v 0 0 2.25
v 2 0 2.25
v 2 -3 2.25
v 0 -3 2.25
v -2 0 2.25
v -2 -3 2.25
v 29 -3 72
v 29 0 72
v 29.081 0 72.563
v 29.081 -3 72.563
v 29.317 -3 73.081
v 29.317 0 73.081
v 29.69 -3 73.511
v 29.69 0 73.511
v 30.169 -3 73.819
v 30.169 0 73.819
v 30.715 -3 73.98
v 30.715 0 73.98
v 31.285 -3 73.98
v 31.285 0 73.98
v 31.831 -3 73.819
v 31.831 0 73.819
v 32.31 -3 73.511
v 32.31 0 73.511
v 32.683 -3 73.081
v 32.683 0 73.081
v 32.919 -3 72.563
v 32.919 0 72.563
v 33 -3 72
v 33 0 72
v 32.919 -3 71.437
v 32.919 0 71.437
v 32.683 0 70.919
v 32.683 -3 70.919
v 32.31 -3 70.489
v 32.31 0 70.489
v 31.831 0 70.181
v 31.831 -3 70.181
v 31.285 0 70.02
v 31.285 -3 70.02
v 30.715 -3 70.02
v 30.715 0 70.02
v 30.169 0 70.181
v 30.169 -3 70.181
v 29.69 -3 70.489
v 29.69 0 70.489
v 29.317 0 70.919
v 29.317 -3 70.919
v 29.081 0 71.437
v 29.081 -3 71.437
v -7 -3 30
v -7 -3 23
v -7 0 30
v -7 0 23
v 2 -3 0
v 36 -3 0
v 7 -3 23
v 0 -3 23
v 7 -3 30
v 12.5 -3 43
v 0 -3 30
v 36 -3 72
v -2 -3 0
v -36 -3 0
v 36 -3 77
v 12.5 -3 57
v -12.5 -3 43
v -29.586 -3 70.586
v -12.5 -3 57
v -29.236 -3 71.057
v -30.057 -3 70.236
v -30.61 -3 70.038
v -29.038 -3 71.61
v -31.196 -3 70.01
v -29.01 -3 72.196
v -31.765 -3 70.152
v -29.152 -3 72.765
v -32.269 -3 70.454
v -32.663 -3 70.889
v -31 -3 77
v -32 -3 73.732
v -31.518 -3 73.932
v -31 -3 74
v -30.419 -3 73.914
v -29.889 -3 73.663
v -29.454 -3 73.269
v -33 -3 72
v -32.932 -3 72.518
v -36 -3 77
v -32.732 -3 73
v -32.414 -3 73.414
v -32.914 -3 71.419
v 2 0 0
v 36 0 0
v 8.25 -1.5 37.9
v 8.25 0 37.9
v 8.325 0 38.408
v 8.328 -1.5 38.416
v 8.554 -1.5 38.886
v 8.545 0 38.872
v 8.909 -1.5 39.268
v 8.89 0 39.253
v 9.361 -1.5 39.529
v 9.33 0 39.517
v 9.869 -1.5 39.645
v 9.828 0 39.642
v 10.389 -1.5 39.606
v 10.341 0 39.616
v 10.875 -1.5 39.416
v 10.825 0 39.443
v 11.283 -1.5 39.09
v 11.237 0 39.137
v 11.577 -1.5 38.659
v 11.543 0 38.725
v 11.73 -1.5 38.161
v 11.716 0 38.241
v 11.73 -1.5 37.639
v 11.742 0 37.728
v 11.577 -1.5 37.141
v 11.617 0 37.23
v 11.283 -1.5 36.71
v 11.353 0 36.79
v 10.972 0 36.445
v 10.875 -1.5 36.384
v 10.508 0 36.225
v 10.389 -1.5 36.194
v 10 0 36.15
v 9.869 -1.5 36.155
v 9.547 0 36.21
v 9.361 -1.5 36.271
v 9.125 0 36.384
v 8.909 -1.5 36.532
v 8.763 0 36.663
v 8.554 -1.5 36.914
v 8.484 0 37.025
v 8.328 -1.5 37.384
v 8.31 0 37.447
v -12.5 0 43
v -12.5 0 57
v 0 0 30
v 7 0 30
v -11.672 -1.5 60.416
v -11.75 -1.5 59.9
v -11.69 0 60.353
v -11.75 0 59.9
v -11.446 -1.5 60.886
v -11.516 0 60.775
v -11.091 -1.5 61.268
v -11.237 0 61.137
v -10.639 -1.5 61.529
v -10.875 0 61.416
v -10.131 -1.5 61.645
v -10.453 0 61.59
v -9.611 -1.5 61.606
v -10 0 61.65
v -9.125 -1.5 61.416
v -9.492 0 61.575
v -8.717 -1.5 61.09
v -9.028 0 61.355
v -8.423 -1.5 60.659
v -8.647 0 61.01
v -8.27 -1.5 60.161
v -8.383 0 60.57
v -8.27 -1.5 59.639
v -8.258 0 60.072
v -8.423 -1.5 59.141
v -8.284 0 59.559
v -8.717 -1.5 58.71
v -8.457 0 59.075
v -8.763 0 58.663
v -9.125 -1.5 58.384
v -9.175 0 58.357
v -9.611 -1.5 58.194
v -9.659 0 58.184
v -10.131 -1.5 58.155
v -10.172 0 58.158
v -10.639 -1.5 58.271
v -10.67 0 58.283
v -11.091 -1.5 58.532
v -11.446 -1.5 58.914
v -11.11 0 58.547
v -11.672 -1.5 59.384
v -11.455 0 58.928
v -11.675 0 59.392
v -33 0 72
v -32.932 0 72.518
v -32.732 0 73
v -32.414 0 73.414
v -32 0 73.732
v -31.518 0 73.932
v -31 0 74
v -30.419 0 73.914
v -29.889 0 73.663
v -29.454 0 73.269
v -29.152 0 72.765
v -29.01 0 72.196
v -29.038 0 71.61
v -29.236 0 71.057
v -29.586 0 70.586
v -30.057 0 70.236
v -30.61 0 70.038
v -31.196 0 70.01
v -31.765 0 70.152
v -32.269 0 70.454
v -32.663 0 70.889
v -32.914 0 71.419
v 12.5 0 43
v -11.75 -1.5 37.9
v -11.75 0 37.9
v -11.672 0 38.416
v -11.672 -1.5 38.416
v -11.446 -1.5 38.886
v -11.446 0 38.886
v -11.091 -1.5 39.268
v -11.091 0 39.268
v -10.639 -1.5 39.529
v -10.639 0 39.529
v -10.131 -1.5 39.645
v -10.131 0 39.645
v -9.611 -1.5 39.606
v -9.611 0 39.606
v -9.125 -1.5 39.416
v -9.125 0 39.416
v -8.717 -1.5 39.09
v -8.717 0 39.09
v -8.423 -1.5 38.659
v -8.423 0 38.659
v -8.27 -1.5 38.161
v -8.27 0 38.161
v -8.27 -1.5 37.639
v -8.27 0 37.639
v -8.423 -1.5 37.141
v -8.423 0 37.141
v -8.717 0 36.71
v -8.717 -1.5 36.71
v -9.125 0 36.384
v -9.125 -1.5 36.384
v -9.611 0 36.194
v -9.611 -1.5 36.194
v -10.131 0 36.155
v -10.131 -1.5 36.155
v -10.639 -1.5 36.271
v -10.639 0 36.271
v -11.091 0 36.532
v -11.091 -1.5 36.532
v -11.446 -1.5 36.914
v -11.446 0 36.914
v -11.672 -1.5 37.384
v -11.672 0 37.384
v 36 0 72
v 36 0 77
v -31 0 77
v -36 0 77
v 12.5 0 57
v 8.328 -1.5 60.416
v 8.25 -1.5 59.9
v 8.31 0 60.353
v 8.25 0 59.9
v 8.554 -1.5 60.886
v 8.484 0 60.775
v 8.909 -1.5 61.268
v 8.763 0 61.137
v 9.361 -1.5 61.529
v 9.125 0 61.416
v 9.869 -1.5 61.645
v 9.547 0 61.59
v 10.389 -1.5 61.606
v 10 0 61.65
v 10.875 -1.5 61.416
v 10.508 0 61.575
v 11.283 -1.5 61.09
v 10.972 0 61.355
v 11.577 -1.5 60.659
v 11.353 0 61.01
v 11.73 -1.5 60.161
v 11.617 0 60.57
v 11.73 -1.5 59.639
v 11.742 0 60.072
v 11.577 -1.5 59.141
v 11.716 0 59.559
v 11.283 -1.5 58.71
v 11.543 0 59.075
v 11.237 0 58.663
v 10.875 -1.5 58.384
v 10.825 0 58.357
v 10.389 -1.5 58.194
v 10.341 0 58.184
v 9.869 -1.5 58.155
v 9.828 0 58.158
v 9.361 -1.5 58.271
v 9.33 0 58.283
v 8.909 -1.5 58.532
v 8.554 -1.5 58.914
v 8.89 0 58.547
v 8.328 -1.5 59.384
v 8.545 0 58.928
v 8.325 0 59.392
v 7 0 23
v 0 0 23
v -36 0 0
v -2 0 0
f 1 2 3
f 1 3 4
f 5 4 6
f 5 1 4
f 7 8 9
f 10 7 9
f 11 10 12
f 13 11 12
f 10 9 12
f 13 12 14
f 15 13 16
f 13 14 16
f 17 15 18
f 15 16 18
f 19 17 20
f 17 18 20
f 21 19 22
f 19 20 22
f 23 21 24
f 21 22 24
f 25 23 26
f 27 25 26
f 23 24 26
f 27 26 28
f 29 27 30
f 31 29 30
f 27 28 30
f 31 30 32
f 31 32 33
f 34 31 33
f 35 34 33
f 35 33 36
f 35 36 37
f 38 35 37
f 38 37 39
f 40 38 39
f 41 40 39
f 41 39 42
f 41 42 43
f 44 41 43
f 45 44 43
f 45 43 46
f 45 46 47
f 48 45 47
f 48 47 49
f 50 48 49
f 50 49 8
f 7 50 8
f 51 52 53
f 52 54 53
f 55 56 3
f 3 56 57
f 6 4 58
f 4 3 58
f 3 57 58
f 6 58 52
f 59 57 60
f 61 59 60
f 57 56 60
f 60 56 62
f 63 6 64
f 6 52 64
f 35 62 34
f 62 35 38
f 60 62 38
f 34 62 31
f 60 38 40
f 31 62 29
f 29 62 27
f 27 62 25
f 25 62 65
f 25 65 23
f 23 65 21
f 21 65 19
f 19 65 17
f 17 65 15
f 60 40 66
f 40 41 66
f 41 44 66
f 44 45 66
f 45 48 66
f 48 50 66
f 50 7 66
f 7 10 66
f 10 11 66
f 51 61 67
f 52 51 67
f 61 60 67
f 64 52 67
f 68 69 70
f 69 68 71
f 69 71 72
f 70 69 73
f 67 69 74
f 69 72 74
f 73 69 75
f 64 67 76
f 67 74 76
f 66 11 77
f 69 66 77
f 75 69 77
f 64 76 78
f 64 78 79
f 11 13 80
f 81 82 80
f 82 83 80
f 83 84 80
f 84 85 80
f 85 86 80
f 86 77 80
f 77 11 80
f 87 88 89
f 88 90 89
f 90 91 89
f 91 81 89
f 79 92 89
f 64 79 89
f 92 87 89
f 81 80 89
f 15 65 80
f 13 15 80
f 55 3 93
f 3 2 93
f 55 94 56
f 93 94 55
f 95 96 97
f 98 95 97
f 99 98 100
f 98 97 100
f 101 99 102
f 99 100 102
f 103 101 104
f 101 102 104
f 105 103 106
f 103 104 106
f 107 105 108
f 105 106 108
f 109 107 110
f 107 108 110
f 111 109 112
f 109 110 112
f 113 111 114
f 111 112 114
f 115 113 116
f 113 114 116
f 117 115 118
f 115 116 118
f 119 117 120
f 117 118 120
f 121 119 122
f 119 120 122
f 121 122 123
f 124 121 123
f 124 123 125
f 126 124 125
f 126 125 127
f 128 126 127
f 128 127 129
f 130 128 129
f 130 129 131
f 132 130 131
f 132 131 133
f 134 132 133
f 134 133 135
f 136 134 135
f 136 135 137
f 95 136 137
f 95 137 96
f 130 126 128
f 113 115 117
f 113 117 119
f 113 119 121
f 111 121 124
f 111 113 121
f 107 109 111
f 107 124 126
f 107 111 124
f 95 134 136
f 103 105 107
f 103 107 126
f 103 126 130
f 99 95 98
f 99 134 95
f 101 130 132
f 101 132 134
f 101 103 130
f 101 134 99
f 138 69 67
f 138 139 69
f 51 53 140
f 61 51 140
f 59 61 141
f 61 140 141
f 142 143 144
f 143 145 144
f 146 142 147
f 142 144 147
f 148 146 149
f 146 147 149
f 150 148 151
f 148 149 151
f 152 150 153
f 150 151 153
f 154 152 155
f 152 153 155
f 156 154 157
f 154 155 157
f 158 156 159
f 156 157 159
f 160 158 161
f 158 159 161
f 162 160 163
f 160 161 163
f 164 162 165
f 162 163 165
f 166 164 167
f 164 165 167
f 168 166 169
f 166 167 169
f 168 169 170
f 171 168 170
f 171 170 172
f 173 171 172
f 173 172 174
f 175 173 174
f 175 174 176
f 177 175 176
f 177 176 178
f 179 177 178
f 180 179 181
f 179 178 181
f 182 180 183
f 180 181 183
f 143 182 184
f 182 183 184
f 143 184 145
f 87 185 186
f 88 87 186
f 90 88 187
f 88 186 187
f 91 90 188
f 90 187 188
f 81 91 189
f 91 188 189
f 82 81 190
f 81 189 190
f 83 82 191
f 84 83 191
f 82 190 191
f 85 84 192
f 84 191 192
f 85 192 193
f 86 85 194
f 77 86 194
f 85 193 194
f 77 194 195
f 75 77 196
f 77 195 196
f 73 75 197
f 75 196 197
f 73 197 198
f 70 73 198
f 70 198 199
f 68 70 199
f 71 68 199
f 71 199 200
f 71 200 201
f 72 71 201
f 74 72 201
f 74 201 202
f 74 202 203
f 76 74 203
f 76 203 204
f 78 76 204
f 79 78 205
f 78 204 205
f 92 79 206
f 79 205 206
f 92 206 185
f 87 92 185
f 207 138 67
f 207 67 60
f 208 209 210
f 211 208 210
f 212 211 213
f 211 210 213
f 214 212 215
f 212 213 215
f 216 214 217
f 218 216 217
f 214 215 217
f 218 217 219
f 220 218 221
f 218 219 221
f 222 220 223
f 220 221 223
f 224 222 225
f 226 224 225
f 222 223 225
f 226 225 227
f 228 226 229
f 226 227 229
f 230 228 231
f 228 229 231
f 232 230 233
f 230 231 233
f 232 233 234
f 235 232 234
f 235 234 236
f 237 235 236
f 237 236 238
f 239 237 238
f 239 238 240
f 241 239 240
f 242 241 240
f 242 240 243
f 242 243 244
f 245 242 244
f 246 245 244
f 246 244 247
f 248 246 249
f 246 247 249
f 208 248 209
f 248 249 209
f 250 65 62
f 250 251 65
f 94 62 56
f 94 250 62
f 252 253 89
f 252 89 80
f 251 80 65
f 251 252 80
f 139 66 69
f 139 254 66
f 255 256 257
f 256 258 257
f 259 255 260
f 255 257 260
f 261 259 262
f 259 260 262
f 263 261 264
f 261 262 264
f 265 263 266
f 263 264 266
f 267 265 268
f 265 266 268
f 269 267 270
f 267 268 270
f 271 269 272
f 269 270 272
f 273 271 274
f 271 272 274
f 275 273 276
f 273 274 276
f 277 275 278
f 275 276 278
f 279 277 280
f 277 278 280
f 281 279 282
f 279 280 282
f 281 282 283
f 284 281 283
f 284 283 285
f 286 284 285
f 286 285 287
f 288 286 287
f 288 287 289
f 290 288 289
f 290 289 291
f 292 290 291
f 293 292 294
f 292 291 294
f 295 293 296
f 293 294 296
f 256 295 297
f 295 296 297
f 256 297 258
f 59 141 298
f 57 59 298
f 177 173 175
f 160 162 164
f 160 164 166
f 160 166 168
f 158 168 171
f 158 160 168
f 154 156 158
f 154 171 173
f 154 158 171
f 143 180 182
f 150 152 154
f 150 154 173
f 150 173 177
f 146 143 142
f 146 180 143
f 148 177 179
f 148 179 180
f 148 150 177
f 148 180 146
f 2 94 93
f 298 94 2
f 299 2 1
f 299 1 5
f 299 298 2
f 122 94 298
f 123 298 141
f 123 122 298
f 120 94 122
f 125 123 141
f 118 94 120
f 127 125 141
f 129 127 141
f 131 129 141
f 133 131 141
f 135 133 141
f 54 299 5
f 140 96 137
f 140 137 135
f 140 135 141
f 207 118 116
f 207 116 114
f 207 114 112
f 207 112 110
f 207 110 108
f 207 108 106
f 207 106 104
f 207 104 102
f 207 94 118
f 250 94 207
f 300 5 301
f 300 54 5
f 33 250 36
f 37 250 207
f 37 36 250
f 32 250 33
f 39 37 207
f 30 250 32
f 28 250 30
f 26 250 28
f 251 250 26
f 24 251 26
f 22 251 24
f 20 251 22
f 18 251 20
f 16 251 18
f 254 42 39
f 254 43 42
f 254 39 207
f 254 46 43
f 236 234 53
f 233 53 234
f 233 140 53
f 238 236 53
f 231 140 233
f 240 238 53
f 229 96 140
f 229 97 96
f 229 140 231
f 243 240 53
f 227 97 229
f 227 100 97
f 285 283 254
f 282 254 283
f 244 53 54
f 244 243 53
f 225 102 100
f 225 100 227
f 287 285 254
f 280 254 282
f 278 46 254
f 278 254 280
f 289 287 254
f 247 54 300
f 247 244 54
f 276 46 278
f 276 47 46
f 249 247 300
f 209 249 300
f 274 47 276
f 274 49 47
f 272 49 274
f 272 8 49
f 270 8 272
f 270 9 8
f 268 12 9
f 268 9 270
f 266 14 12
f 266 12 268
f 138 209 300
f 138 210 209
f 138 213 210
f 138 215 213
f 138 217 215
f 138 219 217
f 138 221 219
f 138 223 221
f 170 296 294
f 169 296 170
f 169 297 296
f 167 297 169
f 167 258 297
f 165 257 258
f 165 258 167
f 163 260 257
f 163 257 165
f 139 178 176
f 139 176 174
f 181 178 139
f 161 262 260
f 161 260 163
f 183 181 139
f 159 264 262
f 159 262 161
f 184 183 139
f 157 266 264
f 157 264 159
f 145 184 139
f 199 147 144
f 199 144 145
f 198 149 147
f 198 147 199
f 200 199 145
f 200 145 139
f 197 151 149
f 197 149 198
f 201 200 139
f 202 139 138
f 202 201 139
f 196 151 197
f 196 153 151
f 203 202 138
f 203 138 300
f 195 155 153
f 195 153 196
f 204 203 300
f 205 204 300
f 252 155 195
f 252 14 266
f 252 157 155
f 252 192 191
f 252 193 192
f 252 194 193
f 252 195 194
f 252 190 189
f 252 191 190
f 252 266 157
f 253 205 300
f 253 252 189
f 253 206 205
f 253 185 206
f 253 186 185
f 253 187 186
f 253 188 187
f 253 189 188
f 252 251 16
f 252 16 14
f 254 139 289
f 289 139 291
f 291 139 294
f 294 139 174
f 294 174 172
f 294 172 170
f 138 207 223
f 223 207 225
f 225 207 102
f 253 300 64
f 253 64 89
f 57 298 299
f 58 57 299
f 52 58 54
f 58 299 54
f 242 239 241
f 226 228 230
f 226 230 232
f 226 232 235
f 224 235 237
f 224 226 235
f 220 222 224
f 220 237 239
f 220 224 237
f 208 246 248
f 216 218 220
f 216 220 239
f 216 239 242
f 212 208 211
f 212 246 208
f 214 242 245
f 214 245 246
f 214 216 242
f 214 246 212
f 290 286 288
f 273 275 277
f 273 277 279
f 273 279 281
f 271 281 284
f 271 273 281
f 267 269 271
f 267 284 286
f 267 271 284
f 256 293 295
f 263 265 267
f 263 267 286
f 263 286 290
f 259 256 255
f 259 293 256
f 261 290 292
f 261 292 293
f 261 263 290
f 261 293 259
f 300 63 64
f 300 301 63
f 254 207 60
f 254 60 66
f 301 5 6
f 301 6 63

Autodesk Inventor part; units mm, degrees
ref_plane "YZ Plane" through (0, 0, 0) normal (1, 0, 0) x (0, 1, 0)
ref_plane "XZ Plane" through (0, 0, 0) normal (0, 1, 0) x (-1, 0, 0)
ref_plane "XY Plane" through (0, 0, 0) normal (0, 0, 1) x (1, 0, 0)
sketch "Boceto1" plane through (0, 0, 0) normal (0, 1, 0) x (-1, 0, 0)
  line L0 (0, 0) -> (36, 0)
  line L1 (36, 0) -> (36, 0)
  line L2 (36, 0) -> (36, 77)
  line L3 (36, 77) -> (36, 77)
  line L4 (36, 77) -> (-36, 77)
  line L5 (-36, 77) -> (-36, 0)
  line L6 (-36, 0) -> (0, 0)
  line L7 (36, 77) -> (31, 77)
  line L8 (31, 77) -> (31, 72)
  line L9 (-36, 77) -> (-36, 77)
  line L10 (-36, 77) -> (-36, 72)
  line L11 (-36, 72) -> (-31, 72)
  circle A0 centre (-31, 72) radius 2
  circle A1 centre (31, 72) radius 2
  line L12 (36, 0) -> (0, 0)
  line L13 (0, 0) -> (0, 2.25)
  line L14 (0, 2.25) -> (2, 2.25)
  line L15 (2, 2.25) -> (2, 0)
  line L16 (0, 2.25) -> (-2, 2.25)
  line L17 (-2, 2.25) -> (-2, 0)
  line L18 (0, 0) -> (0, 50)
  line L19 (-12.5, 57) -> (12.5, 57)
  line L20 (12.5, 57) -> (12.5, 43)
  line L21 (12.5, 43) -> (-12.5, 43)
  line L22 (-12.5, 43) -> (-12.5, 57)
  line L23 (-12.5, 57) -> (12.5, 43) construction
  line L24 (12.5, 57) -> (-12.5, 43) construction
  line L25 (-12.5, 57) -> (12.5, 57)
  line L26 (12.5, 57) -> (12.5, 62.4)
  line L27 (12.5, 62.4) -> (-12.5, 62.4)
  line L28 (-12.5, 62.4) -> (-12.5, 57)
  line L29 (12.5, 62.4) -> (10, 62.4)
  line L30 (10, 62.4) -> (10, 59.9)
  line L31 (-12.5, 62.4) -> (-10, 62.4)
  line L32 (-10, 62.4) -> (-10, 59.9)
  circle A2 centre (10, 59.9) radius 1.75
  circle A3 centre (-10, 59.9) radius 1.75
  line L33 (-12.5, 62.4) -> (-12.5, 35.4)
  line L34 (-12.5, 35.4) -> (12.5, 35.4)
  line L35 (12.5, 35.4) -> (12.5, 62.4)
  line L36 (12.5, 62.4) -> (-12.5, 62.4)
  line L37 (-12.5, 35.4) -> (-10, 35.4)
  line L38 (-10, 35.4) -> (-10, 37.9)
  line L39 (12.5, 35.4) -> (12.5, 37.9)
  line L40 (12.5, 37.9) -> (10, 37.9)
  circle A4 centre (10, 37.9) radius 1.75
  circle A5 centre (-10, 37.9) radius 1.75
  circle A6 centre (31, 72) radius 4
  circle A7 centre (-31, 72) radius 4
  line L41 (0, 0) -> (0, 30)
  line L42 (0, 30) -> (0, 23)
  line L43 (0, 23) -> (7, 23)
  line L44 (7, 23) -> (7, 30)
  line L45 (7, 30) -> (-7, 30)
  line L46 (-7, 30) -> (-7, 23)
  line L47 (-7, 23) -> (0, 23)
  point P0 (2, 0)
  dimension "d0" = 36
  dimension "d1" = 0
  dimension "d2" = 77
  dimension "d3" = 0
  dimension "d4" = 72
  dimension "d5" = 5
  dimension "d6" = 5
  dimension "d7" = 0
  dimension "d8" = 5
  dimension "d9" = 5
  dimension "d10" = 4
  dimension "d11" = 4
  dimension "d14" = 36
  dimension "d15" = 2.25
  dimension "d16" = 2
  dimension "d17" = 2
  dimension "d18" = 50
  dimension "d19" = 25
  dimension "d20" = 14
  dimension "d21" = 5.4
  dimension "d22" = 2.5
  dimension "d23" = 2.5
  dimension "d24" = 2.5
  dimension "d25" = 2.5
  dimension "d26" = 3.5
  dimension "d27" = 3.5
  dimension "d28" = 27
  dimension "d29" = 25
  dimension "d30" = 2.5
  dimension "d31" = 2.5
  dimension "d32" = 2.5
  dimension "d33" = 2.5
  dimension "d34" = 3.5
  dimension "d35" = 3.5
  dimension "d50" = 8
  dimension "d51" = 8
  dimension "d61" = 30
  dimension "d63" = 7
  dimension "d64" = 14
  dimension "d65" = 7
  dimension "d66" = 0
extrude "Extrusión1" add sketch "Boceto1" against normal blind 3 contours A6 | A7 | A5 | L34 L33 L21 L18 | A4 | L18 L21 L35 L34 | L15 L14 L16 L17 L6 L5 L4 L2 L0 | A2 | A3 | L19 L28 L27 L26
extrude "Extrusión2" cut sketch "Boceto1" against normal blind 1.5 contours A5 | A4 | A2 | A3
thread "Rosca1" size "M4x0.7" class "6H" standard "ANSI Metric M Profile" full length
thread "Rosca2" size "M4x0.7" class "6H" standard "ANSI Metric M Profile" full length
thread "Rosca3" size "M3.5x0.6" class "6H" standard "ANSI Metric M Profile" full length
thread "Rosca4" size "M3.5x0.6" class "6H" standard "ANSI Metric M Profile" full length
thread "Rosca5" size "M3.5x0.6" class "6H" standard "ANSI Metric M Profile" full length
thread "Rosca6" size "M3.5x0.6" class "6H" standard "ANSI Metric M Profile" full length
extrude "Extrusión3" [suppressed]
equation "\"d0\" = 0.5 * box_in_width"
equation "\"d2\" = box_in_deep"
equation "\"d4\" = box_in_width"
equation "\"d5\" = offset + 0.5 * screw_Dhead"
equation "\"d6\" = offset + 0.5 * screw_Dhead"
equation "\"d8\" = offset + 0.5 * screw_Dhead"
equation "\"d9\" = offset + 0.5 * screw_Dhead"
equation "\"d10\" = screw_d"
equation "\"d11\" = screw_d"
equation "\"d14\" = 0.5 * box_in_width"
equation "\"d15\" = 1.5 * thikness_box"
equation "\"d19\" = screen_width"
equation "\"d20\" = screen_height"
equation "\"d21\" = top_from_screen"
equation "\"d22\" = offset_screw_screen + 0.5 * screw_d_screen"
equation "\"d23\" = offset_screw_screen + 0.5 * screw_d_screen"
equation "\"d24\" = offset_screw_screen + 0.5 * screw_d_screen"
equation "\"d25\" = offset_screw_screen + 0.5 * screw_d_screen"
equation "\"d28\" = height_screen_total"
equation "\"d29\" = screen_width"
equation "\"d30\" = offset_screw_screen + 0.5 * screw_d_screen"
equation "\"d31\" = offset_screw_screen + 0.5 * screw_d_screen"
equation "\"d32\" = offset_screw_screen + 0.5 * screw_d_screen"
equation "\"d33\" = offset_screw_screen + 0.5 * screw_d_screen"
equation "\"d50\" = screw_Dhead"
equation "\"d51\" = screw_Dhead"
equation "\"d64\" = 2 * d63"
equation "\"d12\" = 2 * thikness_box"
equation "\"d36\" = deep_screw_screen"
equation "\"thikness\" = 2"
equation "\"offset\" = 1"
equation "\"r1\" = 5.55"
equation "\"r2o\" = 59.75"
equation "\"delta_y\" = 6"
equation "\"wire_d\" = 1"
equation "\"width_ang_spring\" = 5"
equation "\"spring_int_diam\" = 8.5"
equation "\"spring_ext_diam\" = 10.5"
equation "\"r3\" = 8.25"
equation "\"r3R\" = 4.75"
equation "\"r3T\" = 6.74537"
equation "\"alpha\" = 54.847297deg"
equation "\"alpha2\" = 270deg"
equation "\"theta3_recogido\" = 305.152703deg"
equation "\"delta_theta_3\" = 45deg"
equation "\"joint_width\" = 12"
equation "\"joint_radius\" = 7.75"
equation "\"shaft_width\" = 15"
equation "\"shaft_joint_diameter\" = 7.75"
equation "\"separation_space\" = 0.5"
equation "\"height_finger\" = 42"
equation "\"cell_screw_head_diameter\" = 4"
equation "\"cell_screw_diameter\" = 2"
equation "\"cell_space\" = 2"
equation "\"cell_width\" = 6"
equation "\"cell_theta_position\" = 60deg"
equation "\"cell_thikness\" = 1"
equation "\"cell_lenght\" = 37"
equation "\"cell_z_space\" = 5"
equation "\"wire_D\" = 2.3"
equation "\"width_link\" = 8"
equation "\"Dt\" = 1.05949"
equation "\"Djoint_shaft\" = 2.3"
equation "\"shaft_x\" = 1.45"
equation "\"shaft_y\" = 6.45"
equation "\"lenght_body_link\" = 186.05"
equation "\"lenght_bar_support\" = 201.65"
equation "\"wire_spring_d\" = 1"
equation "\"spring_int_d\" = 6"
equation "\"spring_lenght\" = 28"
equation "\"trigger_offset\" = 2"
equation "\"m2_theta2o\" = 107deg"
equation "\"m2_r2\" = 28"
equation "\"e\" = 9"
equation "\"So\" = 17"
equation "\"m2_theta3o\" = -30deg"
equation "\"m2_r3\" = 19.75"
equation "\"m2_delta_theta1\" = 15deg"
equation "\"m2_theta3f\" = -60deg"
equation "\"trigger_thumb_lenght\" = 6"
equation "\"width_r12\" = 8"
equation "\"m2_r1\" = 25.2"
equation "\"r3_thikness\" = 3.5"
equation "\"t_thikness\" = 3"
equation "\"tg_width\" = 4"
equation "\"pivot_screw_d\" = 4"
equation "\"pivot_diameter\" = 7"
equation "\"sj_diam_shaft\" = 6"
equation "\"sj_groove\" = 2"
equation "\"sj_groove_deep\" = 7"
equation "\"sj_head_D\" = 7"
equation "\"sj_head_d\" = 4.7464"
equation "\"sj_head_height\" = 5"
equation "\"sf_lenght\" = 9.5"
equation "\"sf_base\" = 3"
equation "\"sf_head_height\" = 3"
equation "\"sf_head_width\" = 4.5"
equation "\"sf_head_offset\" = 0.25"
equation "\"sf_head_grip_width\" = 2"
equation "\"sf_head_angle\" = 45deg"
equation "\"sf_thikness\" = 5"
equation "\"screw_Dhead\" = 8"
equation "\"screw_d\" = 4"
equation "\"screw_lenght\" = 12"
equation "\"screwJ_base_D\" = 9"
equation "\"screwJ_top_D\" = 13"
equation "\"gj_D\" = 6"
equation "\"gj_d\" = 4"
equation "\"gj_out_section\" = 6"
equation "\"box_in_deep\" = 77"
equation "\"box_in_width\" = 72"
equation "\"box_in_height\" = 35"
equation "\"thikness_box\" = 1.5"
equation "\"box_slim_slider_lenght\" = 116"
equation "\"sf_flex_separation\" = 38.66667"
equation "\"flex_separation_theta\" = 60deg"
equation "\"box_fat_slider_lenght\" = 67"
equation "\"int_width_slider\" = 2"
equation "\"ext_width_slider\" = 3.5"
equation "\"fat_width_slider\" = 2"
equation "\"slim_width_slider\" = 1.5"
equation "\"sfbox_width\" = 1.5"
equation "\"sfbox_tip_width\" = 2.5"
equation "\"sfbox_theta1\" = 60deg"
equation "\"sfbox_theta2\" = 45deg"
equation "\"agarradera_theta\" = 60deg"
equation "\"agarradera_width\" = 4"
equation "\"agarradera_position\" = 82.13077"
equation "\"screen_width\" = 25"
equation "\"screen_height\" = 14"
equation "\"screw_d_screen\" = 3"
equation "\"offset_screw_screen\" = 1"
equation "\"height_screen_total\" = 27"
equation "\"top_from_screen\" = 5.4"
equation "\"deep_screw_screen\" = 1.5"
properties part number "Box_cover"
